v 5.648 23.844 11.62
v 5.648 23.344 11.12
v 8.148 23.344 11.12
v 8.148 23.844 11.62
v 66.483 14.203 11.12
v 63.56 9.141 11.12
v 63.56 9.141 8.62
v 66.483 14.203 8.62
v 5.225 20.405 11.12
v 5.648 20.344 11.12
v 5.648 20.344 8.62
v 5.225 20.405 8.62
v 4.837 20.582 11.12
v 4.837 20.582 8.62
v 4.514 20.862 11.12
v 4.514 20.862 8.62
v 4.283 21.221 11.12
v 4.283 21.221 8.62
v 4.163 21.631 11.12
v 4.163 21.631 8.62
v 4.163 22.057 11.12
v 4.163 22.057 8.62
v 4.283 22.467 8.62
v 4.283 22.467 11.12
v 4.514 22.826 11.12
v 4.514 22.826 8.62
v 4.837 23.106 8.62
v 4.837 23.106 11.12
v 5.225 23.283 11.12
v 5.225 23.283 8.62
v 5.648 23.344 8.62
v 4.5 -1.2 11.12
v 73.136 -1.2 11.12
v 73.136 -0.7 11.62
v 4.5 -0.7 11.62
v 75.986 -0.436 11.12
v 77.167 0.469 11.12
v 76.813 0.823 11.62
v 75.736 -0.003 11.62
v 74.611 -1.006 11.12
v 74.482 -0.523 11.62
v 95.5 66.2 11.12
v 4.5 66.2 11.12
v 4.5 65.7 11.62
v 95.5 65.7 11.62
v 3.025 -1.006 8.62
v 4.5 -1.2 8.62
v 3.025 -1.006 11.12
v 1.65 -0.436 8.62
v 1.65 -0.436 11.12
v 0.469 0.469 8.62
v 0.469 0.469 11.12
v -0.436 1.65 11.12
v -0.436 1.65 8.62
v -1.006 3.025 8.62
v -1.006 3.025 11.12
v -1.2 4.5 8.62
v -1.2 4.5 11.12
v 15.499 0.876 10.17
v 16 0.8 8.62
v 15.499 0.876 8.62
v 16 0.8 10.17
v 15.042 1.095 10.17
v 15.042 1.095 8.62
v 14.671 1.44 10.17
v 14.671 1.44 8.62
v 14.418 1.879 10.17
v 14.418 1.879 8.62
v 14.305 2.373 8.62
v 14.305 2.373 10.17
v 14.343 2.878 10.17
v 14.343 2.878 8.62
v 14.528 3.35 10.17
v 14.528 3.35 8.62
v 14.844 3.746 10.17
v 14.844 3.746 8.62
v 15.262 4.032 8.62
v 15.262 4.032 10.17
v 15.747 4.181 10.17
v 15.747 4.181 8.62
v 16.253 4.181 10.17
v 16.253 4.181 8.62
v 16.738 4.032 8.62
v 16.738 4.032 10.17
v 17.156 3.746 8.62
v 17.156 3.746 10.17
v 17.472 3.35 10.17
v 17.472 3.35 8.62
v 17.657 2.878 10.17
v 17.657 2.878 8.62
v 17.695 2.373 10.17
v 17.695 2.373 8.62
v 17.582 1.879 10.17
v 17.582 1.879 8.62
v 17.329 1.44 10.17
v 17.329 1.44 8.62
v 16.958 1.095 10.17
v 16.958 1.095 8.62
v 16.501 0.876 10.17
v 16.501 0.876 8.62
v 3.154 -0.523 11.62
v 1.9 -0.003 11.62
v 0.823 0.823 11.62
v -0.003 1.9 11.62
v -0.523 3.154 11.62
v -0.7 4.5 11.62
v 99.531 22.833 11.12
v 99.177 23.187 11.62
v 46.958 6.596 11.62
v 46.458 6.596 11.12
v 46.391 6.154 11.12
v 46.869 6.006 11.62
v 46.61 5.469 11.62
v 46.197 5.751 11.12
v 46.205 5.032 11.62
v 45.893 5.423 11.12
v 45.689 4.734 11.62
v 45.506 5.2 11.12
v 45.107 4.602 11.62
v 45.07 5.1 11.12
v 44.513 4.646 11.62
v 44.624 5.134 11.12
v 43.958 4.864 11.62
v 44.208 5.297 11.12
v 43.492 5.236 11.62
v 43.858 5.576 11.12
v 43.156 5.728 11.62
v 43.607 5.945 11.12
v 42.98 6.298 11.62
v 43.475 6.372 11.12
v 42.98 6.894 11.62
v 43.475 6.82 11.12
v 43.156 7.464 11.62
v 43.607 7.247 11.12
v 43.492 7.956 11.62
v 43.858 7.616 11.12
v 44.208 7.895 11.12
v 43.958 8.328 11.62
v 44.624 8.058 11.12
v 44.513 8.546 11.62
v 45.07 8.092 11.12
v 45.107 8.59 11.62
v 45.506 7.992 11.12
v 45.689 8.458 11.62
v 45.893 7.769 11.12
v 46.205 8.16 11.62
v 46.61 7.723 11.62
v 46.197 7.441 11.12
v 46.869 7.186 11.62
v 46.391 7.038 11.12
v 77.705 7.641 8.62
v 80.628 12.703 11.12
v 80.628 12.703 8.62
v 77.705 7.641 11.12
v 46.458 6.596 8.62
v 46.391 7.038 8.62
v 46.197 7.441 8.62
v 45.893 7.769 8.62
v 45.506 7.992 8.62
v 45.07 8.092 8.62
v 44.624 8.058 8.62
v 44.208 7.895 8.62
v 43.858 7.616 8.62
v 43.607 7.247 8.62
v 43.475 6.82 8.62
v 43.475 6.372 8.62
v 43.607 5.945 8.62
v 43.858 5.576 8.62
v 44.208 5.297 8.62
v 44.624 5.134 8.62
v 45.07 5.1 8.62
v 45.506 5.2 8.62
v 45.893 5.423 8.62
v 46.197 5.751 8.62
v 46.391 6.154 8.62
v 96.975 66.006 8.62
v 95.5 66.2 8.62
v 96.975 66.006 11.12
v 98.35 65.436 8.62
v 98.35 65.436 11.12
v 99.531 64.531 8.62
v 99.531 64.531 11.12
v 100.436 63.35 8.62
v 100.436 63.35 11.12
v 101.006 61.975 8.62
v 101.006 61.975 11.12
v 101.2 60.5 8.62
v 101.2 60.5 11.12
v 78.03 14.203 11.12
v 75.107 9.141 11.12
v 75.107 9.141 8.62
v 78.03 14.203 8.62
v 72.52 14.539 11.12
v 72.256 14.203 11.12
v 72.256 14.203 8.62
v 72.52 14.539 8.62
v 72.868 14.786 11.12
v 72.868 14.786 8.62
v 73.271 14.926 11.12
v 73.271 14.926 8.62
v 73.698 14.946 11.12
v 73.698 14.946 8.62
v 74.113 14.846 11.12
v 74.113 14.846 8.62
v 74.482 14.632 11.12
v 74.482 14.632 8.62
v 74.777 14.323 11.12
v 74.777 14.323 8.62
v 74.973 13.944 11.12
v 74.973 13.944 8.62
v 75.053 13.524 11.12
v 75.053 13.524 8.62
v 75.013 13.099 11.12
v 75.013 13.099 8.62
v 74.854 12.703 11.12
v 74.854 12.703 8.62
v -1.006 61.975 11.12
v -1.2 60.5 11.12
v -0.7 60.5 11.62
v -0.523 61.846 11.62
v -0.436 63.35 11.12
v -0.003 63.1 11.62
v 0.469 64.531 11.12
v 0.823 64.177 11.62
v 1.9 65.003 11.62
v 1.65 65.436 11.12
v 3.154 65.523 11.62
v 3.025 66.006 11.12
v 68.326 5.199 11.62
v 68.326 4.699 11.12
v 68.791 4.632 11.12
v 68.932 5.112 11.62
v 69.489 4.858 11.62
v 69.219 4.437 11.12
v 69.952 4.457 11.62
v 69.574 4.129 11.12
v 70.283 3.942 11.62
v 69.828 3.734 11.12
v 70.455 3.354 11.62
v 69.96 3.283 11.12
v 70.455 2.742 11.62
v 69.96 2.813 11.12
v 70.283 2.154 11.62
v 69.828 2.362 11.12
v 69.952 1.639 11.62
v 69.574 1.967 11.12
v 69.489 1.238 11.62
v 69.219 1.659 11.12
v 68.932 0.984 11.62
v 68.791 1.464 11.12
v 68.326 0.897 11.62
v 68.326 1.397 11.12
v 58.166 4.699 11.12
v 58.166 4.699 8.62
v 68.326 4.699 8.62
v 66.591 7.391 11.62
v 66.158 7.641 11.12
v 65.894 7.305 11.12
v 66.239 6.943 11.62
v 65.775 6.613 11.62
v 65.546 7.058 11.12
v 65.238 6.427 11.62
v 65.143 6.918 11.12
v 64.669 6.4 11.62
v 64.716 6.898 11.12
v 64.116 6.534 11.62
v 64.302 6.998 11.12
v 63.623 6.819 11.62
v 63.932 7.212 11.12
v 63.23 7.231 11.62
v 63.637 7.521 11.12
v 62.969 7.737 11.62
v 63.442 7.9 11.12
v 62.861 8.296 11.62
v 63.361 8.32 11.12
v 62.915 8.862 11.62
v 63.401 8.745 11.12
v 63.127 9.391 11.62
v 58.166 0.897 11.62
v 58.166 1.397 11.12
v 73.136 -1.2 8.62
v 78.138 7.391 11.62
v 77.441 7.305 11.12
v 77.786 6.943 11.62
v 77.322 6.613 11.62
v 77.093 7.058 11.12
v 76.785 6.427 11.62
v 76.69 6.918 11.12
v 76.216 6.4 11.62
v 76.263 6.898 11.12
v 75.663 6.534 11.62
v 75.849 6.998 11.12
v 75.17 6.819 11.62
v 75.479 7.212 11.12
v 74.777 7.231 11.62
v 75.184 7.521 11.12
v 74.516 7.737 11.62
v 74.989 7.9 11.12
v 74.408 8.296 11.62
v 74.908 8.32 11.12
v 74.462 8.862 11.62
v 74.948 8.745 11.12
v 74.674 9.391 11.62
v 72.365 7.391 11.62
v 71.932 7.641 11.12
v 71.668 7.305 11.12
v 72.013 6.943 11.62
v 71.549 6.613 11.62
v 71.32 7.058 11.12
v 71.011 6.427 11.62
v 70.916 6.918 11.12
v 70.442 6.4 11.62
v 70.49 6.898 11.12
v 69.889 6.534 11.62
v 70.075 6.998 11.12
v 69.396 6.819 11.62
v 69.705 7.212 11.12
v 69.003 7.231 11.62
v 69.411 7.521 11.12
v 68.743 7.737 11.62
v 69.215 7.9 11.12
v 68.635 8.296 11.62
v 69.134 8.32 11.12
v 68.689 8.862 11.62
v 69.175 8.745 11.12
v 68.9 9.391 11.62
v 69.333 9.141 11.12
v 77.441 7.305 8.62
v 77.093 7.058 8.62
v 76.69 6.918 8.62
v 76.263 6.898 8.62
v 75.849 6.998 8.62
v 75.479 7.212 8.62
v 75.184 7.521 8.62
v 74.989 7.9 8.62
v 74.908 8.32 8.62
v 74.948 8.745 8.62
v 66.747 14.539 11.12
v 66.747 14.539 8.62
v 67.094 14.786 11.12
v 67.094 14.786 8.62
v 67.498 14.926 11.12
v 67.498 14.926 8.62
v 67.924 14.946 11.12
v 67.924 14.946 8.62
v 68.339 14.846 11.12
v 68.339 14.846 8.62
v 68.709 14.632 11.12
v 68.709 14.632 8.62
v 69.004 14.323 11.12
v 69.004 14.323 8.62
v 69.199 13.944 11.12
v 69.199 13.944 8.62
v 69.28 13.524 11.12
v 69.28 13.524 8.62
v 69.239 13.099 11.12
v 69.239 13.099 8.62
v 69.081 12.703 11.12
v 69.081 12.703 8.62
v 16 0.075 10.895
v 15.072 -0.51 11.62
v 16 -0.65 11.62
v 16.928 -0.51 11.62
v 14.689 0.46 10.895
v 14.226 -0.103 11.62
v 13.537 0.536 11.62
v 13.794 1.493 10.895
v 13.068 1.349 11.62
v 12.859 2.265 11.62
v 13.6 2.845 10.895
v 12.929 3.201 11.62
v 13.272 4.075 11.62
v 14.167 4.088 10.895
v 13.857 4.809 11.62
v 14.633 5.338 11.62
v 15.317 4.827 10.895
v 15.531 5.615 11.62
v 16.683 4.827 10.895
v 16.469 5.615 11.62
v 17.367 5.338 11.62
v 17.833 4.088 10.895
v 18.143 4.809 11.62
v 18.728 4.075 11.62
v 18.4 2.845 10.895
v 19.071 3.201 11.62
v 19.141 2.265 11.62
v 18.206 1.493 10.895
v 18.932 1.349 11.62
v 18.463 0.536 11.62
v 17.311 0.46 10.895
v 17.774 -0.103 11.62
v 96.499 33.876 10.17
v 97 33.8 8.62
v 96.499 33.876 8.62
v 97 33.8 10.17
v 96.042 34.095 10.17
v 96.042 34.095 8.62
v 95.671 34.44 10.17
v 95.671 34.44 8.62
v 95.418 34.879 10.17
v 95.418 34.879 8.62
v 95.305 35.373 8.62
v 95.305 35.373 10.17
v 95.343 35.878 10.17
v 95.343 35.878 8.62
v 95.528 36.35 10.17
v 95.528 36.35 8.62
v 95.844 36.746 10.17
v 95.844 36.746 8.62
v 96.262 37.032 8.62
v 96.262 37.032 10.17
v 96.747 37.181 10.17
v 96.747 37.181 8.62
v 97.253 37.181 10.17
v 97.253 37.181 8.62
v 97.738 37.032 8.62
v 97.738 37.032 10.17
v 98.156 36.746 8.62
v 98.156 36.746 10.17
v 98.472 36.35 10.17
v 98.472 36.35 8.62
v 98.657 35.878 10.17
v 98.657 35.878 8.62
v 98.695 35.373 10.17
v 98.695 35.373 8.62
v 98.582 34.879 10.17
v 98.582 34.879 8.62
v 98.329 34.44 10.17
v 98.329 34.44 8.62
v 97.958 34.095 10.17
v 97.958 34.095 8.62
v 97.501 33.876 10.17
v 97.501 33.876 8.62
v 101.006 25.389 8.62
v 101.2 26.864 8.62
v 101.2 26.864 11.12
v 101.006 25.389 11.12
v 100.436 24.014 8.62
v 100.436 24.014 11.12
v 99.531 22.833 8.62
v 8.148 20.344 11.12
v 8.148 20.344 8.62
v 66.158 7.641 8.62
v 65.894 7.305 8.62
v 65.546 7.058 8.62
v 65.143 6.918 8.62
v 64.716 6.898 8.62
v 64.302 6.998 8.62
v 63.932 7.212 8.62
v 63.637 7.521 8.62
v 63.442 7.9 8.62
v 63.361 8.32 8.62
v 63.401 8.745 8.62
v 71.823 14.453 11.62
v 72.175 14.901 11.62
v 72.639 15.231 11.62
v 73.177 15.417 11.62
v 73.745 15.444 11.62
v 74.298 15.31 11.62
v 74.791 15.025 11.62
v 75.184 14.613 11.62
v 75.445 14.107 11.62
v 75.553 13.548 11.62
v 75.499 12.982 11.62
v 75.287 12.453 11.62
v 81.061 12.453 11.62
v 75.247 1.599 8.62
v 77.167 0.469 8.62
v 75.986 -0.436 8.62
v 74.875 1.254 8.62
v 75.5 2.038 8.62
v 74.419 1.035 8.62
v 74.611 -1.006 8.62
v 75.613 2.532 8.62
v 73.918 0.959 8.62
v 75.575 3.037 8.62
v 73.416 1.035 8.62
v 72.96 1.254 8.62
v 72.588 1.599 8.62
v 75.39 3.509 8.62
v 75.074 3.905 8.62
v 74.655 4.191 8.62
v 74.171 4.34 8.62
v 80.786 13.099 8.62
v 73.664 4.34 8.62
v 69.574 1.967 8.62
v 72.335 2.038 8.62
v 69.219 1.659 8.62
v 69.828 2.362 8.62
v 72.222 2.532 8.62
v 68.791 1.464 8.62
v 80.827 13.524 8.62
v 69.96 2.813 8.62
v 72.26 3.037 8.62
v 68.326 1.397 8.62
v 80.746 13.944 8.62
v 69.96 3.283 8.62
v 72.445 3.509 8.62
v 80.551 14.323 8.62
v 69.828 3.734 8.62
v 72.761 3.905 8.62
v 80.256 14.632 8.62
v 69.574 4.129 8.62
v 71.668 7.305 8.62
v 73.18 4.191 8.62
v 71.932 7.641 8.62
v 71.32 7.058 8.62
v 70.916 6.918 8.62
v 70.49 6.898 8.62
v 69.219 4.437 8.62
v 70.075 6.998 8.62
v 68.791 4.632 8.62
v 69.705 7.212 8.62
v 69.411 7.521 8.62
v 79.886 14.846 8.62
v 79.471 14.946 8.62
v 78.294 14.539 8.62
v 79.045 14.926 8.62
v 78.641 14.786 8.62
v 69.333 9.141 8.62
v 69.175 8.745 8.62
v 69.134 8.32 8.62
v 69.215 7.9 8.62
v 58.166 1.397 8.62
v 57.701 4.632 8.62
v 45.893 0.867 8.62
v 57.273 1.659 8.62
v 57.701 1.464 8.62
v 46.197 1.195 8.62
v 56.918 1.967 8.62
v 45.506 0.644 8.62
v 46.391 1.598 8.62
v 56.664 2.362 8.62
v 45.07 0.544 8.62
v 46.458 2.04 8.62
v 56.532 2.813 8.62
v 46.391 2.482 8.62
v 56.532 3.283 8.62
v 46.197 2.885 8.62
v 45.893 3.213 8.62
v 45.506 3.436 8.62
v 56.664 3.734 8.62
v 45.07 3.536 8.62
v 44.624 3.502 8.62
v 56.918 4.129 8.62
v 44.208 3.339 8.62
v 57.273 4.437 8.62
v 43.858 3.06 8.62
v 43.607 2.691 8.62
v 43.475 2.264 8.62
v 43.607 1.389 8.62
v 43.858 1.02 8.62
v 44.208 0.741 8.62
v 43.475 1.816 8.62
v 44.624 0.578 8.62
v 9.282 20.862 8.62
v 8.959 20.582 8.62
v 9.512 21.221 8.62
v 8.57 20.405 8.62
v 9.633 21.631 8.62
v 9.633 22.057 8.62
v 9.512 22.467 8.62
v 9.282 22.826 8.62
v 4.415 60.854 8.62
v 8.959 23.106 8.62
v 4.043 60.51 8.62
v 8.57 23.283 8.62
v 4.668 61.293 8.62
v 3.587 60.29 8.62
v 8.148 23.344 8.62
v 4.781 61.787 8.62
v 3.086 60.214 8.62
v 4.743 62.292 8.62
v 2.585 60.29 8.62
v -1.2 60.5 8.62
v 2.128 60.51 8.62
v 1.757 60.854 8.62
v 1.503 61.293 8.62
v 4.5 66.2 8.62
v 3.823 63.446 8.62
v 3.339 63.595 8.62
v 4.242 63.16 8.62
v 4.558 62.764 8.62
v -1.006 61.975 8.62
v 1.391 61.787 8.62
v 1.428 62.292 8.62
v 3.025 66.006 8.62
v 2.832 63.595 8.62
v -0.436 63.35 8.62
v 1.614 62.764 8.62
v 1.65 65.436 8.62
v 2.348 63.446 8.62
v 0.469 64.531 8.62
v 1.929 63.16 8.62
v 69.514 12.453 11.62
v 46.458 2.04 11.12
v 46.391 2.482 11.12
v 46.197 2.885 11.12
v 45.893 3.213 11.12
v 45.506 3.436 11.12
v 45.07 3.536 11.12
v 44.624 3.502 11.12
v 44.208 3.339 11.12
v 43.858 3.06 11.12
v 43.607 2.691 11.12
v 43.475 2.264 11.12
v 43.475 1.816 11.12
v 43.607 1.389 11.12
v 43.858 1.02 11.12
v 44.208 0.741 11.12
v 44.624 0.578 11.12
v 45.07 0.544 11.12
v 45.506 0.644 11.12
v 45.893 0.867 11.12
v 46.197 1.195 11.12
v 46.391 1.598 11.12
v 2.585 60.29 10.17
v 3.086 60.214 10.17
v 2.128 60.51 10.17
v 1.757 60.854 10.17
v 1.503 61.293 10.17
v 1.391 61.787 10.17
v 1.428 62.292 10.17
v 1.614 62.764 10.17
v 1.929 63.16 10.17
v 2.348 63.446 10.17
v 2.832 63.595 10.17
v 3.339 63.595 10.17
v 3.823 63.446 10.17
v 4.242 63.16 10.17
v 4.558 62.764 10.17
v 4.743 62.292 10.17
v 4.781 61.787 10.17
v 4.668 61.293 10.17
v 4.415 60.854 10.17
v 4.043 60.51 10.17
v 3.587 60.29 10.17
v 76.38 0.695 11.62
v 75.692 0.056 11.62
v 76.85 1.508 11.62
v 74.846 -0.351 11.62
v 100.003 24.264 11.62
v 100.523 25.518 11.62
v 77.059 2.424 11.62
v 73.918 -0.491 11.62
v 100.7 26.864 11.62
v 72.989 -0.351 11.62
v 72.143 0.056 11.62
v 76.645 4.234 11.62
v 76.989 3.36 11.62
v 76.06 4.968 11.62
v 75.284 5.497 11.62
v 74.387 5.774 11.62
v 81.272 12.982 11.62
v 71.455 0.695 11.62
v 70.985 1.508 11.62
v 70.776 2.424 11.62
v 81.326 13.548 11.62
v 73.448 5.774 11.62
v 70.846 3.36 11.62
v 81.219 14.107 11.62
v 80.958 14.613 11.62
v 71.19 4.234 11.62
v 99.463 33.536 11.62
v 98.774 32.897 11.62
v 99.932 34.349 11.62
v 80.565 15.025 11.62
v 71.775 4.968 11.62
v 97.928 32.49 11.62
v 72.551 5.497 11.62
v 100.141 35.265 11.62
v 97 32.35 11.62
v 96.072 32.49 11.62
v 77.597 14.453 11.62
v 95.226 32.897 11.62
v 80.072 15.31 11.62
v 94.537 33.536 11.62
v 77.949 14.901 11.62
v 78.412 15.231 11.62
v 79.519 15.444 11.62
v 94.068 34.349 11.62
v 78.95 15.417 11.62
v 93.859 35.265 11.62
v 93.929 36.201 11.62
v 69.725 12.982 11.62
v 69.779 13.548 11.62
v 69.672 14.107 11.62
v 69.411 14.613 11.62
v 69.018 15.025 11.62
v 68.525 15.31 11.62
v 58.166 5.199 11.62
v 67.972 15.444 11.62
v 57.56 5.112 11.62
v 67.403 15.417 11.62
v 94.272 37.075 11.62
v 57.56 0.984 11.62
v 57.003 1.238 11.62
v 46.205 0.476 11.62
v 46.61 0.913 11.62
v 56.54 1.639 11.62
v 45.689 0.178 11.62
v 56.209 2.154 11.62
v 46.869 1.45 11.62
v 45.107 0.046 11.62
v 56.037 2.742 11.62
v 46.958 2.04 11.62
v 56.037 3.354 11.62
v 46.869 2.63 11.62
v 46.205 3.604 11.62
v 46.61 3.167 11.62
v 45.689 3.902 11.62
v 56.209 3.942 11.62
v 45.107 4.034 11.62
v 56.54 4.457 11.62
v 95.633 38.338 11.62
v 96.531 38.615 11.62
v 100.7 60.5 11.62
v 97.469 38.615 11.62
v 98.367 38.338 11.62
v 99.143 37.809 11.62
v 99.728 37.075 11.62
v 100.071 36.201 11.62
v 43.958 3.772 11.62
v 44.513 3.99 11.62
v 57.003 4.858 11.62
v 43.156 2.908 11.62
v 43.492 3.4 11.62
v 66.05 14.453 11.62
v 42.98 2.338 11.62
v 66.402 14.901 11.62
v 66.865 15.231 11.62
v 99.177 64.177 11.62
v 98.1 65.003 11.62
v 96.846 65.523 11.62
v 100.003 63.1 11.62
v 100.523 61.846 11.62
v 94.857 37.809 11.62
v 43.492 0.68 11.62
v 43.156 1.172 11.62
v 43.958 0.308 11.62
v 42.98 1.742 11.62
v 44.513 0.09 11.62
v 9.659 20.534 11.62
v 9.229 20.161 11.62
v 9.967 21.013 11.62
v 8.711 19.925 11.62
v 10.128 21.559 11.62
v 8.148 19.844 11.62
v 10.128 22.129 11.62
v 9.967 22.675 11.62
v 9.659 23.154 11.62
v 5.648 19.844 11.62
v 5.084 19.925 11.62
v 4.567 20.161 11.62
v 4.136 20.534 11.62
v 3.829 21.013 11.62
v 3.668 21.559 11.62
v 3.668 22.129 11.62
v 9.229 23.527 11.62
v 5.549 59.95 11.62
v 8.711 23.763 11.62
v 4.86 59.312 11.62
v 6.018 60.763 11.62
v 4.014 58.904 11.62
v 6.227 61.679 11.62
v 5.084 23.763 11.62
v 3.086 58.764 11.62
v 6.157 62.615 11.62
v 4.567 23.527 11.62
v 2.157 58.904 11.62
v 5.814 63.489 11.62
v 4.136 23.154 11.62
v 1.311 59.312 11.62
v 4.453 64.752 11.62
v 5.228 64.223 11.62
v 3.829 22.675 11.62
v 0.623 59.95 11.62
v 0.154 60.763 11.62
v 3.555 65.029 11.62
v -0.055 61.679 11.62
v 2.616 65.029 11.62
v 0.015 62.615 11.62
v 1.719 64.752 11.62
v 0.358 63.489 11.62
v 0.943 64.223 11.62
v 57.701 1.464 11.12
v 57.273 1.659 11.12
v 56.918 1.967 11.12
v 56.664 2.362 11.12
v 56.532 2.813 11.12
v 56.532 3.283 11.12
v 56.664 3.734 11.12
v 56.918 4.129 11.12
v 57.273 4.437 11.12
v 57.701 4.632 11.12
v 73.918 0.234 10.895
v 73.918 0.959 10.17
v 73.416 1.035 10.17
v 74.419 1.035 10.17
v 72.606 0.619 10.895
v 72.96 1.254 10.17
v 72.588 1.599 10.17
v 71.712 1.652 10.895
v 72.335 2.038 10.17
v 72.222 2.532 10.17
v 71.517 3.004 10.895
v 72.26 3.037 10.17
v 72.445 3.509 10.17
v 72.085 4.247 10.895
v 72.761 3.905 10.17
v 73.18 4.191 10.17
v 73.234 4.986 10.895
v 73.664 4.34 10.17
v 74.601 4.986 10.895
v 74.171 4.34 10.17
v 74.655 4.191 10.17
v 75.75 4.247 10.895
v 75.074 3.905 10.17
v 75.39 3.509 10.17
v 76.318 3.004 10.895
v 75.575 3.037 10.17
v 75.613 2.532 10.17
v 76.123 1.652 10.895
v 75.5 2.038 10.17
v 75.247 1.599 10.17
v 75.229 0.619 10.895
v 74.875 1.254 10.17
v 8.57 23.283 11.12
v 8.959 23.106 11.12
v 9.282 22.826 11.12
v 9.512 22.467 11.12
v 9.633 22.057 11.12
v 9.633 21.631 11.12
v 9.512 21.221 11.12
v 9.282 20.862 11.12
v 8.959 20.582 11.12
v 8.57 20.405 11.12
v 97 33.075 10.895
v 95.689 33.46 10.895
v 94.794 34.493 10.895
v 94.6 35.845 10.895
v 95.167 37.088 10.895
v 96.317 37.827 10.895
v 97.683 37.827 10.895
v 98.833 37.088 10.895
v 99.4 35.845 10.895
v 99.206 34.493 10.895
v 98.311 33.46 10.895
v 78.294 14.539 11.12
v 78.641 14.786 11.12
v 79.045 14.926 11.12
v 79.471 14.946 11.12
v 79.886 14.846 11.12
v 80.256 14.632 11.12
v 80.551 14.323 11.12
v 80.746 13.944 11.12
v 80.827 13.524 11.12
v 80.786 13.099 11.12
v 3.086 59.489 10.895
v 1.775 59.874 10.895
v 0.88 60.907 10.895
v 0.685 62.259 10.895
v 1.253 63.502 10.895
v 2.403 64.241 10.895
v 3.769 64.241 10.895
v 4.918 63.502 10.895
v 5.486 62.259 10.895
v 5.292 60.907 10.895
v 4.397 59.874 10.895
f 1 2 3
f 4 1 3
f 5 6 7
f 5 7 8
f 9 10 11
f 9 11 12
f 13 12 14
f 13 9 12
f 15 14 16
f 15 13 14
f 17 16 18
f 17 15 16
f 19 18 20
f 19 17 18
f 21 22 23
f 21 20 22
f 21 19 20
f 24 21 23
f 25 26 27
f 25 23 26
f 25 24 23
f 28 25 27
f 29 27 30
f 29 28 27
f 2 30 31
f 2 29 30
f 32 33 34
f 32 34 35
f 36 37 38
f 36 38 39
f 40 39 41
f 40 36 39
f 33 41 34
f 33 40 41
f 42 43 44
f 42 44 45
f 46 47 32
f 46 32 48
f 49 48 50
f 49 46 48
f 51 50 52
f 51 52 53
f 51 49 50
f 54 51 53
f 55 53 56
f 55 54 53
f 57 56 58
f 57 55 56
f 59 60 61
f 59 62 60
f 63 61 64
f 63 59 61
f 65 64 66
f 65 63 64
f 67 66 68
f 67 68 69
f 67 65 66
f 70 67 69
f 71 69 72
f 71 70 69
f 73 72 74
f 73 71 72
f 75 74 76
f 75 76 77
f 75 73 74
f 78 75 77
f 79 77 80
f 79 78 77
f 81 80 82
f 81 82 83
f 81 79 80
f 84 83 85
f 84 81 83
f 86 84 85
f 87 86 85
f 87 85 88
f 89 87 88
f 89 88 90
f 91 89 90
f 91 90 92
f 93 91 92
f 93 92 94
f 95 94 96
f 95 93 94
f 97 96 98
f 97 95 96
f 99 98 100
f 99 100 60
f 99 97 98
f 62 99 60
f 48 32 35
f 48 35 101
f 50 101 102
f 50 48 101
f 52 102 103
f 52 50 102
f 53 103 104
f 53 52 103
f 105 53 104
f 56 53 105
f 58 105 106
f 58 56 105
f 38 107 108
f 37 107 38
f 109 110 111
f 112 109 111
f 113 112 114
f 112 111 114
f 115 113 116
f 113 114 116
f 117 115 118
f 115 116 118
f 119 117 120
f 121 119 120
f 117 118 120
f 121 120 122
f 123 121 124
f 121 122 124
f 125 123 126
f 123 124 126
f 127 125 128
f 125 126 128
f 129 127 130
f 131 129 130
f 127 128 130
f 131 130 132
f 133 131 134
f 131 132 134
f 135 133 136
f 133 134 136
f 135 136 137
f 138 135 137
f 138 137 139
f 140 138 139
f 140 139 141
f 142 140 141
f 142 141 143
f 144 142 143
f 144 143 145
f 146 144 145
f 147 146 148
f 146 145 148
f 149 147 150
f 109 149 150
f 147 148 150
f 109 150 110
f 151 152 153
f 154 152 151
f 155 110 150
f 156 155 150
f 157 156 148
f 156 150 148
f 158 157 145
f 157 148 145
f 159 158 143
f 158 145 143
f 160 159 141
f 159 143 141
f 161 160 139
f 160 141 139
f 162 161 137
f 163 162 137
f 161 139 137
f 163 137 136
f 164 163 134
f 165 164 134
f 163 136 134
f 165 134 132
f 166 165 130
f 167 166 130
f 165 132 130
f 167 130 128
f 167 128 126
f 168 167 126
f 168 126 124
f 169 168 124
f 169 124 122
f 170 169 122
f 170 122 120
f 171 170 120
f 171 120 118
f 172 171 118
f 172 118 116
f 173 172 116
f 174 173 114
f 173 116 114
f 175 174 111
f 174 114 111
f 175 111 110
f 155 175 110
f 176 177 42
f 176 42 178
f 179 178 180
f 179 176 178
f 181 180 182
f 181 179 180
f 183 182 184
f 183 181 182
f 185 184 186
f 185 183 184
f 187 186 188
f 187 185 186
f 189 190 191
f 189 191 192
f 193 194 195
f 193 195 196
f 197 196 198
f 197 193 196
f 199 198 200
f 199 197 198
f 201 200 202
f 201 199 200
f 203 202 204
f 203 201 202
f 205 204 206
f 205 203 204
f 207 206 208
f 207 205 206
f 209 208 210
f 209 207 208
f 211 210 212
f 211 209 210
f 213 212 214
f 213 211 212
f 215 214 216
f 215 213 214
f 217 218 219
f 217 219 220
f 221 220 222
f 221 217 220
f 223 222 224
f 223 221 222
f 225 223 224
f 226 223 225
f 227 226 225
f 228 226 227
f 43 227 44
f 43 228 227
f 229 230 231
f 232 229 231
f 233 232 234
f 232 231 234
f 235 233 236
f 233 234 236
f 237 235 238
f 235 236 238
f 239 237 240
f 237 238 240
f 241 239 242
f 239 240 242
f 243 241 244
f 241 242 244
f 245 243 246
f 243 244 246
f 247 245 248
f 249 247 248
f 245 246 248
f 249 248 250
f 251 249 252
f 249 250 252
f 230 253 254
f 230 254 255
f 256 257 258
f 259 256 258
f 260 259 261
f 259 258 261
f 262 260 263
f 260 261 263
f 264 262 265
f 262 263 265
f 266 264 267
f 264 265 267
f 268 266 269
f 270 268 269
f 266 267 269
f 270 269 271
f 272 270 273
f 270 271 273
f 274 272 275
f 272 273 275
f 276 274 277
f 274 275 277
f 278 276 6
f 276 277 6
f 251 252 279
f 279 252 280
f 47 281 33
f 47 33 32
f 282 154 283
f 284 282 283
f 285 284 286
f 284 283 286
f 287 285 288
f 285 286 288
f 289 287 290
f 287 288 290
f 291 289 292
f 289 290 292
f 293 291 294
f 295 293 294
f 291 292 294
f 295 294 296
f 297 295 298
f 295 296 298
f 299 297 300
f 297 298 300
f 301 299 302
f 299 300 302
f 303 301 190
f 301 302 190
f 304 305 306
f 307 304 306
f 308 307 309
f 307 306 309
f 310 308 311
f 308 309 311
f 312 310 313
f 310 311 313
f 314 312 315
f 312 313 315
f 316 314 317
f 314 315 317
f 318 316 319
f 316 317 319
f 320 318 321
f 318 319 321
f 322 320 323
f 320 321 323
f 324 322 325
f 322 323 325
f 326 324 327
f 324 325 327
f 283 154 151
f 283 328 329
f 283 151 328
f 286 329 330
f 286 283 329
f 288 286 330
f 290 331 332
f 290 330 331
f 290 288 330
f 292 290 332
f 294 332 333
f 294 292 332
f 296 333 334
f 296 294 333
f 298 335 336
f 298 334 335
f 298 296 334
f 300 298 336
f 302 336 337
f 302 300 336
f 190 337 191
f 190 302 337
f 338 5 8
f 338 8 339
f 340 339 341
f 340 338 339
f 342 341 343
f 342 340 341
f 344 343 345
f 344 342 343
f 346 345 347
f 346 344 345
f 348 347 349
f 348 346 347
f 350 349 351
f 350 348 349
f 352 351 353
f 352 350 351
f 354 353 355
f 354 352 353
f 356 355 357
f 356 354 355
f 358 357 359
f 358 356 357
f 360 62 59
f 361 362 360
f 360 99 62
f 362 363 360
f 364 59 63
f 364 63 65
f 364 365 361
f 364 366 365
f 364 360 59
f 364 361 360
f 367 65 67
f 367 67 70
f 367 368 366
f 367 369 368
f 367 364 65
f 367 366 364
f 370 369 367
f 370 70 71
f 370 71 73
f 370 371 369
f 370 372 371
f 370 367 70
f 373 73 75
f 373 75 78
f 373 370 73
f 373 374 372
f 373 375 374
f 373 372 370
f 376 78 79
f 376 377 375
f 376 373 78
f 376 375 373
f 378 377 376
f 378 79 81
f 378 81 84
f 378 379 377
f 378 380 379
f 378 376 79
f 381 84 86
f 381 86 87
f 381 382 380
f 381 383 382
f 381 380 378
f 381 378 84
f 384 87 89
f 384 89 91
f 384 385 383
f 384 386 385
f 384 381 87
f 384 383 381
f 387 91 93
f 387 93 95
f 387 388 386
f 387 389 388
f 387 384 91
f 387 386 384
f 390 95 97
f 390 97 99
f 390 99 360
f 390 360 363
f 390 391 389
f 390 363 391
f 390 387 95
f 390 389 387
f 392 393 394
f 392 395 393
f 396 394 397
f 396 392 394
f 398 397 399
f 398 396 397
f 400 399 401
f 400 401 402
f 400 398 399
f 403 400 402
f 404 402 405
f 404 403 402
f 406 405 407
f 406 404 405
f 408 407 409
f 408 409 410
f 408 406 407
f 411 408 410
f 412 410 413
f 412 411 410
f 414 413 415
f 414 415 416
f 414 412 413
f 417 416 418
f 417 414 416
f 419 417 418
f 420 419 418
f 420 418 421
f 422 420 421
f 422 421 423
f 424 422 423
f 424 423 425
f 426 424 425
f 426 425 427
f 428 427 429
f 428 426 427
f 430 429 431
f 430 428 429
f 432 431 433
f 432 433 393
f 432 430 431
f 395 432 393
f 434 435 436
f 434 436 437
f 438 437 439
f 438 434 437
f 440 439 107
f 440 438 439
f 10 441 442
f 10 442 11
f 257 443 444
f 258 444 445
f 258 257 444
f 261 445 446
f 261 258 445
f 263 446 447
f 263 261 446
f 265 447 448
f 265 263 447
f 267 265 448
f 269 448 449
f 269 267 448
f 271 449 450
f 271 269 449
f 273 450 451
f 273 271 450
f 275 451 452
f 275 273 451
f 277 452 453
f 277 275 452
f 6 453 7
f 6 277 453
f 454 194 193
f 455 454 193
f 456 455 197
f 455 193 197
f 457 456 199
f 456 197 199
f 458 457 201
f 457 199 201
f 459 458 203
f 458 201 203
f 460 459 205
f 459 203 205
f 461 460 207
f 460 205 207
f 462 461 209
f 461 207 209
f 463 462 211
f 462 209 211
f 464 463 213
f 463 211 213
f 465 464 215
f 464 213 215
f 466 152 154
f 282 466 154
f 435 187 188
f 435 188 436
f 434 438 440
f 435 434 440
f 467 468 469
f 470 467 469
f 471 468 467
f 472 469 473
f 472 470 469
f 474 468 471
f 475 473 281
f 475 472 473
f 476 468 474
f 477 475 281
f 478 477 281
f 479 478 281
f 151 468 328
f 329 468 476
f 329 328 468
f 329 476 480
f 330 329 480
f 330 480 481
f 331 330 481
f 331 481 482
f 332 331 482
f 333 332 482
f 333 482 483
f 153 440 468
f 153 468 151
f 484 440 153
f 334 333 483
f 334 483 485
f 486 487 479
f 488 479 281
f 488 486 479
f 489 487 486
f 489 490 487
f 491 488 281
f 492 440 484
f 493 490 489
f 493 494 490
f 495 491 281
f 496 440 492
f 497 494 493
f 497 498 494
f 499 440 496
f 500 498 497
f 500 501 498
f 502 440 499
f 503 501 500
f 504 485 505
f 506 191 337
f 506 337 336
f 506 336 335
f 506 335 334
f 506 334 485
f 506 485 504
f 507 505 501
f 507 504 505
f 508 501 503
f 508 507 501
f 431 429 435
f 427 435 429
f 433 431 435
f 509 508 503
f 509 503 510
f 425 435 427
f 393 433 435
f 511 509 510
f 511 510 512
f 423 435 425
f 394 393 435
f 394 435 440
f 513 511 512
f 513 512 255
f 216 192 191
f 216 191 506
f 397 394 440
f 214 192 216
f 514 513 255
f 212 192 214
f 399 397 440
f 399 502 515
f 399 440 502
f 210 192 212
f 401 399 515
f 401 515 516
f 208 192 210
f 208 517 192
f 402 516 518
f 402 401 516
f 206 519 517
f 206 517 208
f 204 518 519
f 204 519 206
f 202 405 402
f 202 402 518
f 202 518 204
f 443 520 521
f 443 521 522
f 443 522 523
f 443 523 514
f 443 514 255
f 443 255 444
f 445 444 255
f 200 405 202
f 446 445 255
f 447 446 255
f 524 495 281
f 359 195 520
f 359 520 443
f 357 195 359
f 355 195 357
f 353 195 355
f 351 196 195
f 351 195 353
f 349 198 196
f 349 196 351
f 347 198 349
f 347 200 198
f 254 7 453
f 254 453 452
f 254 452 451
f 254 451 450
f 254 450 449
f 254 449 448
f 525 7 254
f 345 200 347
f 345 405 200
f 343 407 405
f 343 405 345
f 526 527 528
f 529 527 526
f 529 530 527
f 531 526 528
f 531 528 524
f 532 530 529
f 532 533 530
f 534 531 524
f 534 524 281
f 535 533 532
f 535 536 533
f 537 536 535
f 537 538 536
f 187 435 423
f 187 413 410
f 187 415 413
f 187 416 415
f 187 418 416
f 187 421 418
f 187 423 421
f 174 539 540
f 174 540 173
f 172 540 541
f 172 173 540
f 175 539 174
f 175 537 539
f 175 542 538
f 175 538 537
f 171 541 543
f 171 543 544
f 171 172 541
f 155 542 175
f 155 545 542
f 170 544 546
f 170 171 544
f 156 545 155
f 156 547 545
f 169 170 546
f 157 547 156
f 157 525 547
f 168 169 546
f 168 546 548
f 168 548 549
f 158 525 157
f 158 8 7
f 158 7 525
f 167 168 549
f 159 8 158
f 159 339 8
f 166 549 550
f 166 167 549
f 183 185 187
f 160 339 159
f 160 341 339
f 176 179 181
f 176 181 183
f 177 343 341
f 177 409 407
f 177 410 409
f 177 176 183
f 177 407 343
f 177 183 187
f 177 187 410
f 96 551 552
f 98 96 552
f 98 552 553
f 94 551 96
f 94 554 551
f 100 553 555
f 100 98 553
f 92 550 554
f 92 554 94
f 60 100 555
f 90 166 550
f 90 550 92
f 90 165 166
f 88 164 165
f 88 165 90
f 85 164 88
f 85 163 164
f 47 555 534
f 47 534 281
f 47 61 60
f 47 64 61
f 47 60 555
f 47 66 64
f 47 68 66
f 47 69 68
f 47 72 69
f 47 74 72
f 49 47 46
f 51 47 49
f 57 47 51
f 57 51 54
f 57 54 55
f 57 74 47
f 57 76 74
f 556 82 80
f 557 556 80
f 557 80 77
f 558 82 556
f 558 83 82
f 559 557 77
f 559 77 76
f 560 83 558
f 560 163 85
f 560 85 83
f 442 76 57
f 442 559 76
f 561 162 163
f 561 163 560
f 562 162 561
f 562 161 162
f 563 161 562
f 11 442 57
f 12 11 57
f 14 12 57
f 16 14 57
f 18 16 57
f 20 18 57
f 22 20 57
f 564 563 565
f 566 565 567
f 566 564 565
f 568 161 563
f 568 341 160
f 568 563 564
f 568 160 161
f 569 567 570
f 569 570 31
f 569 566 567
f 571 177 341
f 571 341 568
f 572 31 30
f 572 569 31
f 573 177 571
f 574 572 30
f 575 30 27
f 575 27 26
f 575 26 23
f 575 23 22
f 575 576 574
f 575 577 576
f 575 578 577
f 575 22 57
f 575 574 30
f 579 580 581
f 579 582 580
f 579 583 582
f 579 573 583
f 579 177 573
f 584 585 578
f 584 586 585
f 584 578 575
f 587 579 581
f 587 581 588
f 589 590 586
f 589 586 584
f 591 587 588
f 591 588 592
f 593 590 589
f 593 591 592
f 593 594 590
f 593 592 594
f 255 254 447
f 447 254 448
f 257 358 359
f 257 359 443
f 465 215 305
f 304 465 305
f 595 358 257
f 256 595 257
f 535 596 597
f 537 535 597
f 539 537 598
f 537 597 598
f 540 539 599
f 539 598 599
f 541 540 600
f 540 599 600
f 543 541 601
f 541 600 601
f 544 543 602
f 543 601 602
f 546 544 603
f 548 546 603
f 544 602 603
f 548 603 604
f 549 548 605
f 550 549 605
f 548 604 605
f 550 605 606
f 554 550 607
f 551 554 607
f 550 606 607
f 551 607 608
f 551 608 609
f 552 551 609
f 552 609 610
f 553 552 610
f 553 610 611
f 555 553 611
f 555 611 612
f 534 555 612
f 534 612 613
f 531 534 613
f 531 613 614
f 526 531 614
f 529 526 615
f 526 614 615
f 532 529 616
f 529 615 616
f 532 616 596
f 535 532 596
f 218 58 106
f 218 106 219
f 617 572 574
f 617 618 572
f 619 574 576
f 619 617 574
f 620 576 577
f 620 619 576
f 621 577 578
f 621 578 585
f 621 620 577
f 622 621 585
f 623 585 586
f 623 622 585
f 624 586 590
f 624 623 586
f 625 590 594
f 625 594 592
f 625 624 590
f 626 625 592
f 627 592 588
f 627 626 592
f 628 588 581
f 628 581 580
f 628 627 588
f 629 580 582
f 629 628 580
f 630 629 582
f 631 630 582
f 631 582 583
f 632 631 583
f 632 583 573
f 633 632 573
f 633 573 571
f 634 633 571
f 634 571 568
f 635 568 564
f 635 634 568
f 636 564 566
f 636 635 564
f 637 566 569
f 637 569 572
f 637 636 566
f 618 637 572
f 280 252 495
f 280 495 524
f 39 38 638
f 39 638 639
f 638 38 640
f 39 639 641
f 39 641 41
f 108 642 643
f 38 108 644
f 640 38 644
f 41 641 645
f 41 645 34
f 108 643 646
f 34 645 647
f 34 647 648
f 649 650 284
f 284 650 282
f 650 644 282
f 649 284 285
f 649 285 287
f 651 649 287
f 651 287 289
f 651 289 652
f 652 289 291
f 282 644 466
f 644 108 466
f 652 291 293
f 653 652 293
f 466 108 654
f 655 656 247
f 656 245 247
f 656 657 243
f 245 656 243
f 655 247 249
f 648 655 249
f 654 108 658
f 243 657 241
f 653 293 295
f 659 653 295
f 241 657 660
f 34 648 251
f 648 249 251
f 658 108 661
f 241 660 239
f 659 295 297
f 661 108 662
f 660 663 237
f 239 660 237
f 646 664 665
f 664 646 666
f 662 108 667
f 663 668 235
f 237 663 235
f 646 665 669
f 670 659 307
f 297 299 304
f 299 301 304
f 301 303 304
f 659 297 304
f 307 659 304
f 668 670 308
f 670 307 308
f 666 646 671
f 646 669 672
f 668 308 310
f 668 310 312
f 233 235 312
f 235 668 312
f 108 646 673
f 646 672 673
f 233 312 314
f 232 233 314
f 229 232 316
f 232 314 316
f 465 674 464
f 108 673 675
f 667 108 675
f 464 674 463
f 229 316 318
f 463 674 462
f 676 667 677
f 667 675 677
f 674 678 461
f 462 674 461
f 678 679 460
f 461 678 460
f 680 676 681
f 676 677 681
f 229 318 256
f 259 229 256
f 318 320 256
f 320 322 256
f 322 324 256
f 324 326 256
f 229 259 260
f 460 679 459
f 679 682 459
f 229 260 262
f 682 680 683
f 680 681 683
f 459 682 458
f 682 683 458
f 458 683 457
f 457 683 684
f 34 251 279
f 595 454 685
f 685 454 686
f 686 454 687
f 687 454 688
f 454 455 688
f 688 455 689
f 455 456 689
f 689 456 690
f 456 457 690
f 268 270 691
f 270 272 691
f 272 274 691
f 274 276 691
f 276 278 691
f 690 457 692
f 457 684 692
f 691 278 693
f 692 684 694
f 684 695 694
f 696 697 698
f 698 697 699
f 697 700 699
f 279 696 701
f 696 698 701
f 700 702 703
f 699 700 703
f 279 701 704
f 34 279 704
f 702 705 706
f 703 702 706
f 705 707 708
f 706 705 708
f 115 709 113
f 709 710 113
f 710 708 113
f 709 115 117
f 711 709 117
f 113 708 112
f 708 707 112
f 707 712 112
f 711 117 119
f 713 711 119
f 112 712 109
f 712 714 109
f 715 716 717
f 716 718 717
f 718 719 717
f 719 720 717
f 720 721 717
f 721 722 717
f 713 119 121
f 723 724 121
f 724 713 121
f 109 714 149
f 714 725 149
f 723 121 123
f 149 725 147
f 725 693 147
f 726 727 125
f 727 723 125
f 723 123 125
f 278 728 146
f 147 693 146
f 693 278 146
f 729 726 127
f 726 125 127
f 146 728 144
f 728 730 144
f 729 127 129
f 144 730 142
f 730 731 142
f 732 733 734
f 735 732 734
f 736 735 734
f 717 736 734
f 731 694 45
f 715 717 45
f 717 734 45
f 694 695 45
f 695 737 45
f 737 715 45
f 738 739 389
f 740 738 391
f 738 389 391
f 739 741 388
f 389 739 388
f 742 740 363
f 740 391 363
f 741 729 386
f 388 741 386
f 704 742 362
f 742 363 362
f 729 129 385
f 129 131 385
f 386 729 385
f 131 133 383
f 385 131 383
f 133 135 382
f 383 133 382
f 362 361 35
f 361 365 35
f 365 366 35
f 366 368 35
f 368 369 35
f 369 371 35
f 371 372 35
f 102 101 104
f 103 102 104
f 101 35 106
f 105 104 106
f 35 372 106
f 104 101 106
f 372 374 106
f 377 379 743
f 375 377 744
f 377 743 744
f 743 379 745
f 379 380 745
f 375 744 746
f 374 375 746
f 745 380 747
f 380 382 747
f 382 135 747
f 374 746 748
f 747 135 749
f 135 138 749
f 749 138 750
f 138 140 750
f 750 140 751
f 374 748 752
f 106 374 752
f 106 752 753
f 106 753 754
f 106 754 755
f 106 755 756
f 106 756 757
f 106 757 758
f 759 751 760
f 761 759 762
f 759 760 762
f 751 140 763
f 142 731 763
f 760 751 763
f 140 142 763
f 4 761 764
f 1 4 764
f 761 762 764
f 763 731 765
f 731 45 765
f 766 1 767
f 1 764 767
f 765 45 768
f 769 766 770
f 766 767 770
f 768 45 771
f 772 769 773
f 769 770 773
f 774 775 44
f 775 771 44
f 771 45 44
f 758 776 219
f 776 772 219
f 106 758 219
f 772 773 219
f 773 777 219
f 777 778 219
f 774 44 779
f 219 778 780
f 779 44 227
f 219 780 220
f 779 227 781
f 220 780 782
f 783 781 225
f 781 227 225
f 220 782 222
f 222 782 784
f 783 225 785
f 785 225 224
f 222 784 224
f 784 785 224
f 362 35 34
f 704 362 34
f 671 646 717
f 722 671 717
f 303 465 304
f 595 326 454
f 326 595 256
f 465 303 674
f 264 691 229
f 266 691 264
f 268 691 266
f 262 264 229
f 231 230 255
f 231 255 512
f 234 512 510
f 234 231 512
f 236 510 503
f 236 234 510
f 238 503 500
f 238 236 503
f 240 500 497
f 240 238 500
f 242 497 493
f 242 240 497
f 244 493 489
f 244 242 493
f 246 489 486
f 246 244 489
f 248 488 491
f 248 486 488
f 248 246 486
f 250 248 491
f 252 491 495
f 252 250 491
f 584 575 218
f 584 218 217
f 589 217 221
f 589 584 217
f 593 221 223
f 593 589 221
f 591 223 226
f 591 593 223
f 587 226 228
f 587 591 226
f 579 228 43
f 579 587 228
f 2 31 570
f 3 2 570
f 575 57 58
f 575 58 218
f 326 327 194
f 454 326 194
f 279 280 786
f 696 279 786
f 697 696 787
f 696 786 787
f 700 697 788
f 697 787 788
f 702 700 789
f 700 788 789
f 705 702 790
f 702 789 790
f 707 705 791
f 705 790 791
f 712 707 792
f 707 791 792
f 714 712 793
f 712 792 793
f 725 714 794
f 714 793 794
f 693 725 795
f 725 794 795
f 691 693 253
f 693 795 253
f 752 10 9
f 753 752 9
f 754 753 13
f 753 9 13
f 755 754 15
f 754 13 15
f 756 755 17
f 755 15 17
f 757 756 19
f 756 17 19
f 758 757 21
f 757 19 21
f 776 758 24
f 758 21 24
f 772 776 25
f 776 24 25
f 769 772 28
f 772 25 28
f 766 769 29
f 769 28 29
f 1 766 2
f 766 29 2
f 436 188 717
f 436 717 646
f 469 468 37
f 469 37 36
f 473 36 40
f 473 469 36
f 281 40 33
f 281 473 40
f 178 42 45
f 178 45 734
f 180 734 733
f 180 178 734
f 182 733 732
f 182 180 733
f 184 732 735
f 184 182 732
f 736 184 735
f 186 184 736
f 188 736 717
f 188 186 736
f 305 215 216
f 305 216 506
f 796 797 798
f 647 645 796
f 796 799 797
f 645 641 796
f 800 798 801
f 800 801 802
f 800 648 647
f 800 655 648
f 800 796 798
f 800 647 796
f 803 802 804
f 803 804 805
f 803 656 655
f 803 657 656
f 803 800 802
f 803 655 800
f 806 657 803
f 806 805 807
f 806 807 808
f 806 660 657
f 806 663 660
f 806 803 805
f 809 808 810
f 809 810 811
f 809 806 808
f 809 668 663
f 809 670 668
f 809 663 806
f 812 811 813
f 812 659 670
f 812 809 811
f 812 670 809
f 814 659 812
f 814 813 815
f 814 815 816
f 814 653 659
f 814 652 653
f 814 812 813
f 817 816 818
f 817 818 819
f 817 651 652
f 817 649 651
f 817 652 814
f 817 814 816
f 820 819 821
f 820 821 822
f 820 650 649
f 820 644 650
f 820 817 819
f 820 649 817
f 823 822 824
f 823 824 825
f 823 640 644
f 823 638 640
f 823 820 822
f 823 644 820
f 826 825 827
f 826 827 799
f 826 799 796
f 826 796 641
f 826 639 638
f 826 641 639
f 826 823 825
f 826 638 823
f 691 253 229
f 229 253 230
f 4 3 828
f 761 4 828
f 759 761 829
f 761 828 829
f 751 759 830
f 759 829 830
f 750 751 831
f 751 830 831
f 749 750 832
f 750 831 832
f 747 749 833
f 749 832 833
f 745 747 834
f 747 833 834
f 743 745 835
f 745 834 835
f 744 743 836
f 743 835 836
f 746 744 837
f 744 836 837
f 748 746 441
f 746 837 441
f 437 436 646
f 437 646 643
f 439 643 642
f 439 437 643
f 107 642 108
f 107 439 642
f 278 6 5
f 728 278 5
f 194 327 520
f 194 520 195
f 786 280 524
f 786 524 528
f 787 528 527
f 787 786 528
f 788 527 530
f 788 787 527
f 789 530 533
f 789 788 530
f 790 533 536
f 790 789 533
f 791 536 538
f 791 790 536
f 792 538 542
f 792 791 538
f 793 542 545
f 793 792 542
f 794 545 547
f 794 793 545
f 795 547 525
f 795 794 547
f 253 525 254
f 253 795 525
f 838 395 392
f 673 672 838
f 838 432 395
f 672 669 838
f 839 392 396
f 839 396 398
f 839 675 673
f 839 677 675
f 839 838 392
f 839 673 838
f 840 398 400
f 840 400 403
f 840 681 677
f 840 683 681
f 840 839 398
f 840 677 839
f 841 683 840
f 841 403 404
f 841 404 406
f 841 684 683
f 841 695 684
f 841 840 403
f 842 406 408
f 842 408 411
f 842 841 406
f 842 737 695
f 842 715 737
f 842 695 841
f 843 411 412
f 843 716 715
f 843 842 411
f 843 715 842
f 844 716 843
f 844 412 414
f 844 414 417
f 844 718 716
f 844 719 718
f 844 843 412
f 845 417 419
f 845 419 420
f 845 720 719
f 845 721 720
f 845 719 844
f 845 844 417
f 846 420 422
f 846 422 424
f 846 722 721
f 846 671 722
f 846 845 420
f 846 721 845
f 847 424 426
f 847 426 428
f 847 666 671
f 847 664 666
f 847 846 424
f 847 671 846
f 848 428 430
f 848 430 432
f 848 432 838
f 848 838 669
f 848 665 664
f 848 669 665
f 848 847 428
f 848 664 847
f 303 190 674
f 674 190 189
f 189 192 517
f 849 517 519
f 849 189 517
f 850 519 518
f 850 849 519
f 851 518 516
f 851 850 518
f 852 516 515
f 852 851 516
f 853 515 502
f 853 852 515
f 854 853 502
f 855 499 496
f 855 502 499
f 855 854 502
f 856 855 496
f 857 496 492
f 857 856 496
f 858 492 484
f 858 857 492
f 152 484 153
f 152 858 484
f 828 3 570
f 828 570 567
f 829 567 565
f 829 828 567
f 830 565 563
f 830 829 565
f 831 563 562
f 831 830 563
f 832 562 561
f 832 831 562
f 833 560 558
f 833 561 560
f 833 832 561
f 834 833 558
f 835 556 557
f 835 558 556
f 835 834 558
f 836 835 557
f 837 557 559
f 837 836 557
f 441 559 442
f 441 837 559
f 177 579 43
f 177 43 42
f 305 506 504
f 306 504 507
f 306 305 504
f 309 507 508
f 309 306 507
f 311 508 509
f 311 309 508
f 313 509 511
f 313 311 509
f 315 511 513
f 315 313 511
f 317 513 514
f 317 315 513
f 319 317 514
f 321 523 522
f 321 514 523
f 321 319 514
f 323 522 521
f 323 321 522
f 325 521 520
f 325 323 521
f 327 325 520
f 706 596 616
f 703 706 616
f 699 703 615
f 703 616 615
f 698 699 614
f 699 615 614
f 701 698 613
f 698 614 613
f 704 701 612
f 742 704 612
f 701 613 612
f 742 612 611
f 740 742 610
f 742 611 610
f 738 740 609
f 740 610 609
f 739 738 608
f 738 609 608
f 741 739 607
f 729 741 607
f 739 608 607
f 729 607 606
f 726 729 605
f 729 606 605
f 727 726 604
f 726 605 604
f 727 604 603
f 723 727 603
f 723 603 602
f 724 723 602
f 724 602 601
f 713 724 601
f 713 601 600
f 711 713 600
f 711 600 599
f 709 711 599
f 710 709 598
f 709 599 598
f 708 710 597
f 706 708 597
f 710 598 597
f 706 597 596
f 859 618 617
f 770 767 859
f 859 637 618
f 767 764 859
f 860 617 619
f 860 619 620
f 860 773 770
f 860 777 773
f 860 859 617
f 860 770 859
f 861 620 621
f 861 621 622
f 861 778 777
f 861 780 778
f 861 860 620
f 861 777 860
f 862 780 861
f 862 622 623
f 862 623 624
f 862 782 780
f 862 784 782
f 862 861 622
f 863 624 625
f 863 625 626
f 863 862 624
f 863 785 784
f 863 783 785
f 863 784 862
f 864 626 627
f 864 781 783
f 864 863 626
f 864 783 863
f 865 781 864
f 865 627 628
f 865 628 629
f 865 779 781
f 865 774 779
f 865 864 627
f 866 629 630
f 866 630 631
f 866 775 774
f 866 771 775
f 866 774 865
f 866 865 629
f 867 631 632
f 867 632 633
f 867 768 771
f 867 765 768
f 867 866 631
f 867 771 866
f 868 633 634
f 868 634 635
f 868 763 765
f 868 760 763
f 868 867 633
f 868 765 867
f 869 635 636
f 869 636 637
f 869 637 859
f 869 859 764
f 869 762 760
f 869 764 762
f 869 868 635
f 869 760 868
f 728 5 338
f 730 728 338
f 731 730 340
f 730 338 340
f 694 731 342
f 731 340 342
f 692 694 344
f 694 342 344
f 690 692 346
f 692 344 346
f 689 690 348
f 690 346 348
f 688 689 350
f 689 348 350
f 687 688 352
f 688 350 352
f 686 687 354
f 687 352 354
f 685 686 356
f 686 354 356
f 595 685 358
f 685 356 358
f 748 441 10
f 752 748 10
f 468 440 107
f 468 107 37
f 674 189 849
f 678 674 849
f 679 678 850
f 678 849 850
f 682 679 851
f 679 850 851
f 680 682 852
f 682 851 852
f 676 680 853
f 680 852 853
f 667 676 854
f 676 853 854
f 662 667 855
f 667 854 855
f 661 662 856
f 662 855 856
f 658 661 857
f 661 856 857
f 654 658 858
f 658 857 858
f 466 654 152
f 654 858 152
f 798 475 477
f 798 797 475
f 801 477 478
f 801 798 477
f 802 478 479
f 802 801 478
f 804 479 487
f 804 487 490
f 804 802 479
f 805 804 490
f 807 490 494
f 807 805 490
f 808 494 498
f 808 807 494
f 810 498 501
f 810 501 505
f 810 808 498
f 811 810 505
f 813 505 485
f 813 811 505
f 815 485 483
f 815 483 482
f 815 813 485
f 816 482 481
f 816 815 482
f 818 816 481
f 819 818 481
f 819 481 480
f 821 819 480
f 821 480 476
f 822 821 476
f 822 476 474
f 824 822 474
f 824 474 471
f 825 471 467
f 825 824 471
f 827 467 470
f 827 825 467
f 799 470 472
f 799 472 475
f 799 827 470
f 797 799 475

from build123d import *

# Parameters (mm, degrees)
BOSS_EXTRUDE1_DEPTH                            = 3
CSK_FOR_M3_FLAT_HEAD_MACHINE_SCREW1_AT_2_COUNT = 2
CSK_FOR_M3_FLAT_HEAD_MACHINE_SCREW1_AT_2_PITCH = 60.801526997
CSK_FOR_M3_FLAT_HEAD_MACHINE_SCREW1_AT_3_COUNT = 2
CSK_FOR_M3_FLAT_HEAD_MACHINE_SCREW1_AT_3_PITCH = 92.34886737
CSK_FOR_M3_FLAT_HEAD_MACHINE_SCREW1_AT_4_COUNT = 2
CSK_FOR_M3_FLAT_HEAD_MACHINE_SCREW1_AT_4_PITCH = 97.558137473
CUT_EXTRUDE1_DEPTH                             = 121.966441627
SKETCH8_R                                      = 1
CUT_EXTRUDE2_DEPTH                             = 10
SKETCH10_R                                     = 1
CUT_EXTRUDE4_DEPTH                             = 10
SKETCH12_R                                     = 1.5
CUT_EXTRUDE5_DEPTH                             = 10
CHAMFER2_SIZE                                  = 0.5


with BuildPart() as part:
    # Sketch2 → Boss-Extrude1 (new body)
    with BuildSketch(Plane.XY.offset(8.62)):
        with BuildLine():
            Line((4.5, 66.2), (95.5, 66.2))
            ThreePointArc((95.5, 66.2), (99.530508653, 64.530508653), (101.2, 60.5))
            Line((101.2, 60.5), (101.2, 26.863961031))
            ThreePointArc((101.2, 26.863961031), (100.766113335, 24.682665466), (99.530508653, 22.833452378))
            Line((99.530508653, 22.833452378), (77.166547622, 0.469491347))
            ThreePointArc((77.166547622, 0.469491347), (75.317334534, -0.766113335), (73.136038969, -1.2))
            Line((73.136038969, -1.2), (4.5, -1.2))
            ThreePointArc((4.5, -1.2), (0.469491347, 0.469491347), (-1.2, 4.5))
            Line((-1.2, 4.5), (-1.2, 60.5))
            ThreePointArc((-1.2, 60.5), (0.469491347, 64.530508653), (4.5, 66.2))
        make_face()
    extrude(amount=BOSS_EXTRUDE1_DEPTH)

    # Sketch5 → CSK for M3 Flat Head Machine Screw1 (revolve, cut)
    with BuildSketch(Plane(origin=(3.085786438, 61.914213562, 11.62), x_dir=(0, -1, 0), z_dir=(1, 0, 0))):
        Polygon((0, 0), (0, 3), (1.7, 3), (1.7, 1.45), (3.15, 0), align=None)
    csk_for_m3_flat_head_machine_screw1 = revolve(axis=Axis((3.085786438, 61.914213562, 17.97), (0, 0, -1)), mode=Mode.SUBTRACT)

    # CSK for M3 Flat Head Machine Screw1 at 2: CSK for M3 Flat Head Machine Screw1 ×2
    with Locations(*[Vector(0.21239949389766488, -0.9771829178777205, 0) * (i * CSK_FOR_M3_FLAT_HEAD_MACHINE_SCREW1_AT_2_PITCH) for i in range(1, CSK_FOR_M3_FLAT_HEAD_MACHINE_SCREW1_AT_2_COUNT)]):
        add(csk_for_m3_flat_head_machine_screw1, mode=Mode.SUBTRACT)

    # CSK for M3 Flat Head Machine Screw1 at 3: CSK for M3 Flat Head Machine Screw1 ×2
    with Locations(*[Vector(0.7670014457738275, -0.6416453710429606, 0) * (i * CSK_FOR_M3_FLAT_HEAD_MACHINE_SCREW1_AT_3_PITCH) for i in range(1, CSK_FOR_M3_FLAT_HEAD_MACHINE_SCREW1_AT_3_COUNT)]):
        add(csk_for_m3_flat_head_machine_screw1, mode=Mode.SUBTRACT)

    # CSK for M3 Flat Head Machine Screw1 at 4: CSK for M3 Flat Head Machine Screw1 ×2
    with Locations(*[Vector(0.9626486933350611, -0.27075356548030866, 0) * (i * CSK_FOR_M3_FLAT_HEAD_MACHINE_SCREW1_AT_4_PITCH) for i in range(1, CSK_FOR_M3_FLAT_HEAD_MACHINE_SCREW1_AT_4_COUNT)]):
        add(csk_for_m3_flat_head_machine_screw1, mode=Mode.SUBTRACT)

    # Sketch6 → Cut-Extrude1 (cut, through all)
    with BuildSketch(Plane.XY.offset(11.62)):
        with BuildLine():
            Line((68.326, 1.397), (58.166, 1.397))
            ThreePointArc((58.166, 1.397), (56.515, 3.048), (58.166, 4.699))
            Line((58.166, 4.699), (68.326, 4.699))
            ThreePointArc((68.326, 4.699), (69.977, 3.048), (68.326, 1.397))
        make_face()
    extrude(amount=-CUT_EXTRUDE1_DEPTH, mode=Mode.SUBTRACT)

    # Sketch8 → Cut-Extrude2 (cut)
    with BuildSketch(Plane.XY.offset(11.62)):
        with Locations((44.958, 2.539999994)):
            Circle(SKETCH8_R)
        with Locations((44.958000001, 6.095999994)):
            Circle(SKETCH8_R)
    extrude(amount=-CUT_EXTRUDE2_DEPTH, mode=Mode.SUBTRACT)

    # Sketch10 → Cut-Extrude4 (cut)
    with BuildSketch(Plane.XY.offset(11.62)):
        with Locations((5.147878003, 21.843999999)):
            Circle(SKETCH10_R)
        with Locations((8.647878003, 21.843999999)):
            Circle(SKETCH10_R)
    extrude(amount=-CUT_EXTRUDE4_DEPTH, mode=Mode.SUBTRACT)

    # Sketch12 → Cut-Extrude5 (cut)
    with BuildSketch(Plane.XY.offset(11.62)):
        with Locations((44.958000001, 6.595999994)):
            Circle(SKETCH12_R)
        with Locations((44.958000001, 2.039999994)):
            Circle(SKETCH12_R)
        with BuildLine():
            Line((5.647878003, 23.343999999), (8.147878003, 23.343999999))
            ThreePointArc((8.147878003, 23.343999999), (9.647878003, 21.843999999), (8.147878003, 20.343999999))
            Line((8.147878003, 20.343999999), (5.647878003, 20.343999999))
            ThreePointArc((5.647878003, 20.343999999), (4.147878003, 21.843999999), (5.647878003, 23.343999999))
        make_face()
        with BuildLine():
            Line((69.33347303, 9.140911087), (72.256122761, 14.203088914))
            ThreePointArc((72.256122761, 14.203088914), (74.305160867, 14.752127019), (74.854198973, 12.703088914))
            Line((74.854198973, 12.703088914), (71.931549242, 7.640911087))
            ThreePointArc((71.931549242, 7.640911087), (69.882511136, 7.091872982), (69.33347303, 9.140911087))
        make_face()
        with BuildLine():
            Line((63.559970339, 9.140911087), (66.482620069, 14.203088914))
            ThreePointArc((66.482620069, 14.203088914), (68.531658175, 14.752127019), (69.080696281, 12.703088914))
            Line((69.080696281, 12.703088914), (66.15804655, 7.640911087))
            ThreePointArc((66.15804655, 7.640911087), (64.109008444, 7.091872982), (63.559970339, 9.140911087))
        make_face()
        with BuildLine():
            Line((75.106975722, 9.140911087), (78.029625453, 14.203088914))
            ThreePointArc((78.029625453, 14.203088914), (80.078663559, 14.752127019), (80.627701665, 12.703088914))
            Line((80.627701665, 12.703088914), (77.705051934, 7.640911087))
            ThreePointArc((77.705051934, 7.640911087), (75.656013828, 7.091872982), (75.106975722, 9.140911087))
        make_face()
    extrude(amount=-CUT_EXTRUDE5_DEPTH, mode=Mode.SUBTRACT)

    # Chamfer2
    chamfer2_edges = [part.edges().sort_by_distance(p)[0] for p in [
        (75.317334534, -0.766113335, 11.62),
        (4.147878003, 21.843999999, 11.62),
        (6.897878003, 20.343999999, 11.62),
        (9.647878003, 21.843999999, 11.62),
        (6.897878003, 23.343999999, 11.62),
        (43.458000001, 6.595999994, 11.62),
        (43.458000001, 2.039999994, 11.62),
        (88.348528137, 11.651471863, 11.62),
        (69.882511136, 7.091872982, 11.62),
        (73.392874107, 10.172000001, 11.62),
        (74.305160867, 14.752127019, 11.62),
        (70.794797896, 11.672000001, 11.62),
        (64.109008444, 7.091872982, 11.62),
        (67.619371415, 10.172000001, 11.62),
        (68.531658175, 14.752127019, 11.62),
        (65.021295204, 11.672000001, 11.62),
        (100.766113335, 24.682665466, 11.62),
        (75.656013828, 7.091872982, 11.62),
        (79.166376799, 10.172000001, 11.62),
        (80.078663559, 14.752127019, 11.62),
        (76.568300588, 11.672000001, 11.62),
        (101.2, 43.681980515, 11.62),
        (99.530508653, 64.530508653, 11.62),
        (50, 66.2, 11.62),
        (0.469491347, 64.530508653, 11.62),
        (-1.2, 32.5, 11.62),
        (0.469491347, 0.469491347, 11.62),
        (69.977, 3.048, 11.62),
        (63.246, 4.699, 11.62),
        (56.515, 3.048, 11.62),
        (63.246, 1.397, 11.62),
        (38.818019485, -1.2, 11.62),
    ]]
    chamfer(chamfer2_edges, length=CHAMFER2_SIZE)


solid = part.part
